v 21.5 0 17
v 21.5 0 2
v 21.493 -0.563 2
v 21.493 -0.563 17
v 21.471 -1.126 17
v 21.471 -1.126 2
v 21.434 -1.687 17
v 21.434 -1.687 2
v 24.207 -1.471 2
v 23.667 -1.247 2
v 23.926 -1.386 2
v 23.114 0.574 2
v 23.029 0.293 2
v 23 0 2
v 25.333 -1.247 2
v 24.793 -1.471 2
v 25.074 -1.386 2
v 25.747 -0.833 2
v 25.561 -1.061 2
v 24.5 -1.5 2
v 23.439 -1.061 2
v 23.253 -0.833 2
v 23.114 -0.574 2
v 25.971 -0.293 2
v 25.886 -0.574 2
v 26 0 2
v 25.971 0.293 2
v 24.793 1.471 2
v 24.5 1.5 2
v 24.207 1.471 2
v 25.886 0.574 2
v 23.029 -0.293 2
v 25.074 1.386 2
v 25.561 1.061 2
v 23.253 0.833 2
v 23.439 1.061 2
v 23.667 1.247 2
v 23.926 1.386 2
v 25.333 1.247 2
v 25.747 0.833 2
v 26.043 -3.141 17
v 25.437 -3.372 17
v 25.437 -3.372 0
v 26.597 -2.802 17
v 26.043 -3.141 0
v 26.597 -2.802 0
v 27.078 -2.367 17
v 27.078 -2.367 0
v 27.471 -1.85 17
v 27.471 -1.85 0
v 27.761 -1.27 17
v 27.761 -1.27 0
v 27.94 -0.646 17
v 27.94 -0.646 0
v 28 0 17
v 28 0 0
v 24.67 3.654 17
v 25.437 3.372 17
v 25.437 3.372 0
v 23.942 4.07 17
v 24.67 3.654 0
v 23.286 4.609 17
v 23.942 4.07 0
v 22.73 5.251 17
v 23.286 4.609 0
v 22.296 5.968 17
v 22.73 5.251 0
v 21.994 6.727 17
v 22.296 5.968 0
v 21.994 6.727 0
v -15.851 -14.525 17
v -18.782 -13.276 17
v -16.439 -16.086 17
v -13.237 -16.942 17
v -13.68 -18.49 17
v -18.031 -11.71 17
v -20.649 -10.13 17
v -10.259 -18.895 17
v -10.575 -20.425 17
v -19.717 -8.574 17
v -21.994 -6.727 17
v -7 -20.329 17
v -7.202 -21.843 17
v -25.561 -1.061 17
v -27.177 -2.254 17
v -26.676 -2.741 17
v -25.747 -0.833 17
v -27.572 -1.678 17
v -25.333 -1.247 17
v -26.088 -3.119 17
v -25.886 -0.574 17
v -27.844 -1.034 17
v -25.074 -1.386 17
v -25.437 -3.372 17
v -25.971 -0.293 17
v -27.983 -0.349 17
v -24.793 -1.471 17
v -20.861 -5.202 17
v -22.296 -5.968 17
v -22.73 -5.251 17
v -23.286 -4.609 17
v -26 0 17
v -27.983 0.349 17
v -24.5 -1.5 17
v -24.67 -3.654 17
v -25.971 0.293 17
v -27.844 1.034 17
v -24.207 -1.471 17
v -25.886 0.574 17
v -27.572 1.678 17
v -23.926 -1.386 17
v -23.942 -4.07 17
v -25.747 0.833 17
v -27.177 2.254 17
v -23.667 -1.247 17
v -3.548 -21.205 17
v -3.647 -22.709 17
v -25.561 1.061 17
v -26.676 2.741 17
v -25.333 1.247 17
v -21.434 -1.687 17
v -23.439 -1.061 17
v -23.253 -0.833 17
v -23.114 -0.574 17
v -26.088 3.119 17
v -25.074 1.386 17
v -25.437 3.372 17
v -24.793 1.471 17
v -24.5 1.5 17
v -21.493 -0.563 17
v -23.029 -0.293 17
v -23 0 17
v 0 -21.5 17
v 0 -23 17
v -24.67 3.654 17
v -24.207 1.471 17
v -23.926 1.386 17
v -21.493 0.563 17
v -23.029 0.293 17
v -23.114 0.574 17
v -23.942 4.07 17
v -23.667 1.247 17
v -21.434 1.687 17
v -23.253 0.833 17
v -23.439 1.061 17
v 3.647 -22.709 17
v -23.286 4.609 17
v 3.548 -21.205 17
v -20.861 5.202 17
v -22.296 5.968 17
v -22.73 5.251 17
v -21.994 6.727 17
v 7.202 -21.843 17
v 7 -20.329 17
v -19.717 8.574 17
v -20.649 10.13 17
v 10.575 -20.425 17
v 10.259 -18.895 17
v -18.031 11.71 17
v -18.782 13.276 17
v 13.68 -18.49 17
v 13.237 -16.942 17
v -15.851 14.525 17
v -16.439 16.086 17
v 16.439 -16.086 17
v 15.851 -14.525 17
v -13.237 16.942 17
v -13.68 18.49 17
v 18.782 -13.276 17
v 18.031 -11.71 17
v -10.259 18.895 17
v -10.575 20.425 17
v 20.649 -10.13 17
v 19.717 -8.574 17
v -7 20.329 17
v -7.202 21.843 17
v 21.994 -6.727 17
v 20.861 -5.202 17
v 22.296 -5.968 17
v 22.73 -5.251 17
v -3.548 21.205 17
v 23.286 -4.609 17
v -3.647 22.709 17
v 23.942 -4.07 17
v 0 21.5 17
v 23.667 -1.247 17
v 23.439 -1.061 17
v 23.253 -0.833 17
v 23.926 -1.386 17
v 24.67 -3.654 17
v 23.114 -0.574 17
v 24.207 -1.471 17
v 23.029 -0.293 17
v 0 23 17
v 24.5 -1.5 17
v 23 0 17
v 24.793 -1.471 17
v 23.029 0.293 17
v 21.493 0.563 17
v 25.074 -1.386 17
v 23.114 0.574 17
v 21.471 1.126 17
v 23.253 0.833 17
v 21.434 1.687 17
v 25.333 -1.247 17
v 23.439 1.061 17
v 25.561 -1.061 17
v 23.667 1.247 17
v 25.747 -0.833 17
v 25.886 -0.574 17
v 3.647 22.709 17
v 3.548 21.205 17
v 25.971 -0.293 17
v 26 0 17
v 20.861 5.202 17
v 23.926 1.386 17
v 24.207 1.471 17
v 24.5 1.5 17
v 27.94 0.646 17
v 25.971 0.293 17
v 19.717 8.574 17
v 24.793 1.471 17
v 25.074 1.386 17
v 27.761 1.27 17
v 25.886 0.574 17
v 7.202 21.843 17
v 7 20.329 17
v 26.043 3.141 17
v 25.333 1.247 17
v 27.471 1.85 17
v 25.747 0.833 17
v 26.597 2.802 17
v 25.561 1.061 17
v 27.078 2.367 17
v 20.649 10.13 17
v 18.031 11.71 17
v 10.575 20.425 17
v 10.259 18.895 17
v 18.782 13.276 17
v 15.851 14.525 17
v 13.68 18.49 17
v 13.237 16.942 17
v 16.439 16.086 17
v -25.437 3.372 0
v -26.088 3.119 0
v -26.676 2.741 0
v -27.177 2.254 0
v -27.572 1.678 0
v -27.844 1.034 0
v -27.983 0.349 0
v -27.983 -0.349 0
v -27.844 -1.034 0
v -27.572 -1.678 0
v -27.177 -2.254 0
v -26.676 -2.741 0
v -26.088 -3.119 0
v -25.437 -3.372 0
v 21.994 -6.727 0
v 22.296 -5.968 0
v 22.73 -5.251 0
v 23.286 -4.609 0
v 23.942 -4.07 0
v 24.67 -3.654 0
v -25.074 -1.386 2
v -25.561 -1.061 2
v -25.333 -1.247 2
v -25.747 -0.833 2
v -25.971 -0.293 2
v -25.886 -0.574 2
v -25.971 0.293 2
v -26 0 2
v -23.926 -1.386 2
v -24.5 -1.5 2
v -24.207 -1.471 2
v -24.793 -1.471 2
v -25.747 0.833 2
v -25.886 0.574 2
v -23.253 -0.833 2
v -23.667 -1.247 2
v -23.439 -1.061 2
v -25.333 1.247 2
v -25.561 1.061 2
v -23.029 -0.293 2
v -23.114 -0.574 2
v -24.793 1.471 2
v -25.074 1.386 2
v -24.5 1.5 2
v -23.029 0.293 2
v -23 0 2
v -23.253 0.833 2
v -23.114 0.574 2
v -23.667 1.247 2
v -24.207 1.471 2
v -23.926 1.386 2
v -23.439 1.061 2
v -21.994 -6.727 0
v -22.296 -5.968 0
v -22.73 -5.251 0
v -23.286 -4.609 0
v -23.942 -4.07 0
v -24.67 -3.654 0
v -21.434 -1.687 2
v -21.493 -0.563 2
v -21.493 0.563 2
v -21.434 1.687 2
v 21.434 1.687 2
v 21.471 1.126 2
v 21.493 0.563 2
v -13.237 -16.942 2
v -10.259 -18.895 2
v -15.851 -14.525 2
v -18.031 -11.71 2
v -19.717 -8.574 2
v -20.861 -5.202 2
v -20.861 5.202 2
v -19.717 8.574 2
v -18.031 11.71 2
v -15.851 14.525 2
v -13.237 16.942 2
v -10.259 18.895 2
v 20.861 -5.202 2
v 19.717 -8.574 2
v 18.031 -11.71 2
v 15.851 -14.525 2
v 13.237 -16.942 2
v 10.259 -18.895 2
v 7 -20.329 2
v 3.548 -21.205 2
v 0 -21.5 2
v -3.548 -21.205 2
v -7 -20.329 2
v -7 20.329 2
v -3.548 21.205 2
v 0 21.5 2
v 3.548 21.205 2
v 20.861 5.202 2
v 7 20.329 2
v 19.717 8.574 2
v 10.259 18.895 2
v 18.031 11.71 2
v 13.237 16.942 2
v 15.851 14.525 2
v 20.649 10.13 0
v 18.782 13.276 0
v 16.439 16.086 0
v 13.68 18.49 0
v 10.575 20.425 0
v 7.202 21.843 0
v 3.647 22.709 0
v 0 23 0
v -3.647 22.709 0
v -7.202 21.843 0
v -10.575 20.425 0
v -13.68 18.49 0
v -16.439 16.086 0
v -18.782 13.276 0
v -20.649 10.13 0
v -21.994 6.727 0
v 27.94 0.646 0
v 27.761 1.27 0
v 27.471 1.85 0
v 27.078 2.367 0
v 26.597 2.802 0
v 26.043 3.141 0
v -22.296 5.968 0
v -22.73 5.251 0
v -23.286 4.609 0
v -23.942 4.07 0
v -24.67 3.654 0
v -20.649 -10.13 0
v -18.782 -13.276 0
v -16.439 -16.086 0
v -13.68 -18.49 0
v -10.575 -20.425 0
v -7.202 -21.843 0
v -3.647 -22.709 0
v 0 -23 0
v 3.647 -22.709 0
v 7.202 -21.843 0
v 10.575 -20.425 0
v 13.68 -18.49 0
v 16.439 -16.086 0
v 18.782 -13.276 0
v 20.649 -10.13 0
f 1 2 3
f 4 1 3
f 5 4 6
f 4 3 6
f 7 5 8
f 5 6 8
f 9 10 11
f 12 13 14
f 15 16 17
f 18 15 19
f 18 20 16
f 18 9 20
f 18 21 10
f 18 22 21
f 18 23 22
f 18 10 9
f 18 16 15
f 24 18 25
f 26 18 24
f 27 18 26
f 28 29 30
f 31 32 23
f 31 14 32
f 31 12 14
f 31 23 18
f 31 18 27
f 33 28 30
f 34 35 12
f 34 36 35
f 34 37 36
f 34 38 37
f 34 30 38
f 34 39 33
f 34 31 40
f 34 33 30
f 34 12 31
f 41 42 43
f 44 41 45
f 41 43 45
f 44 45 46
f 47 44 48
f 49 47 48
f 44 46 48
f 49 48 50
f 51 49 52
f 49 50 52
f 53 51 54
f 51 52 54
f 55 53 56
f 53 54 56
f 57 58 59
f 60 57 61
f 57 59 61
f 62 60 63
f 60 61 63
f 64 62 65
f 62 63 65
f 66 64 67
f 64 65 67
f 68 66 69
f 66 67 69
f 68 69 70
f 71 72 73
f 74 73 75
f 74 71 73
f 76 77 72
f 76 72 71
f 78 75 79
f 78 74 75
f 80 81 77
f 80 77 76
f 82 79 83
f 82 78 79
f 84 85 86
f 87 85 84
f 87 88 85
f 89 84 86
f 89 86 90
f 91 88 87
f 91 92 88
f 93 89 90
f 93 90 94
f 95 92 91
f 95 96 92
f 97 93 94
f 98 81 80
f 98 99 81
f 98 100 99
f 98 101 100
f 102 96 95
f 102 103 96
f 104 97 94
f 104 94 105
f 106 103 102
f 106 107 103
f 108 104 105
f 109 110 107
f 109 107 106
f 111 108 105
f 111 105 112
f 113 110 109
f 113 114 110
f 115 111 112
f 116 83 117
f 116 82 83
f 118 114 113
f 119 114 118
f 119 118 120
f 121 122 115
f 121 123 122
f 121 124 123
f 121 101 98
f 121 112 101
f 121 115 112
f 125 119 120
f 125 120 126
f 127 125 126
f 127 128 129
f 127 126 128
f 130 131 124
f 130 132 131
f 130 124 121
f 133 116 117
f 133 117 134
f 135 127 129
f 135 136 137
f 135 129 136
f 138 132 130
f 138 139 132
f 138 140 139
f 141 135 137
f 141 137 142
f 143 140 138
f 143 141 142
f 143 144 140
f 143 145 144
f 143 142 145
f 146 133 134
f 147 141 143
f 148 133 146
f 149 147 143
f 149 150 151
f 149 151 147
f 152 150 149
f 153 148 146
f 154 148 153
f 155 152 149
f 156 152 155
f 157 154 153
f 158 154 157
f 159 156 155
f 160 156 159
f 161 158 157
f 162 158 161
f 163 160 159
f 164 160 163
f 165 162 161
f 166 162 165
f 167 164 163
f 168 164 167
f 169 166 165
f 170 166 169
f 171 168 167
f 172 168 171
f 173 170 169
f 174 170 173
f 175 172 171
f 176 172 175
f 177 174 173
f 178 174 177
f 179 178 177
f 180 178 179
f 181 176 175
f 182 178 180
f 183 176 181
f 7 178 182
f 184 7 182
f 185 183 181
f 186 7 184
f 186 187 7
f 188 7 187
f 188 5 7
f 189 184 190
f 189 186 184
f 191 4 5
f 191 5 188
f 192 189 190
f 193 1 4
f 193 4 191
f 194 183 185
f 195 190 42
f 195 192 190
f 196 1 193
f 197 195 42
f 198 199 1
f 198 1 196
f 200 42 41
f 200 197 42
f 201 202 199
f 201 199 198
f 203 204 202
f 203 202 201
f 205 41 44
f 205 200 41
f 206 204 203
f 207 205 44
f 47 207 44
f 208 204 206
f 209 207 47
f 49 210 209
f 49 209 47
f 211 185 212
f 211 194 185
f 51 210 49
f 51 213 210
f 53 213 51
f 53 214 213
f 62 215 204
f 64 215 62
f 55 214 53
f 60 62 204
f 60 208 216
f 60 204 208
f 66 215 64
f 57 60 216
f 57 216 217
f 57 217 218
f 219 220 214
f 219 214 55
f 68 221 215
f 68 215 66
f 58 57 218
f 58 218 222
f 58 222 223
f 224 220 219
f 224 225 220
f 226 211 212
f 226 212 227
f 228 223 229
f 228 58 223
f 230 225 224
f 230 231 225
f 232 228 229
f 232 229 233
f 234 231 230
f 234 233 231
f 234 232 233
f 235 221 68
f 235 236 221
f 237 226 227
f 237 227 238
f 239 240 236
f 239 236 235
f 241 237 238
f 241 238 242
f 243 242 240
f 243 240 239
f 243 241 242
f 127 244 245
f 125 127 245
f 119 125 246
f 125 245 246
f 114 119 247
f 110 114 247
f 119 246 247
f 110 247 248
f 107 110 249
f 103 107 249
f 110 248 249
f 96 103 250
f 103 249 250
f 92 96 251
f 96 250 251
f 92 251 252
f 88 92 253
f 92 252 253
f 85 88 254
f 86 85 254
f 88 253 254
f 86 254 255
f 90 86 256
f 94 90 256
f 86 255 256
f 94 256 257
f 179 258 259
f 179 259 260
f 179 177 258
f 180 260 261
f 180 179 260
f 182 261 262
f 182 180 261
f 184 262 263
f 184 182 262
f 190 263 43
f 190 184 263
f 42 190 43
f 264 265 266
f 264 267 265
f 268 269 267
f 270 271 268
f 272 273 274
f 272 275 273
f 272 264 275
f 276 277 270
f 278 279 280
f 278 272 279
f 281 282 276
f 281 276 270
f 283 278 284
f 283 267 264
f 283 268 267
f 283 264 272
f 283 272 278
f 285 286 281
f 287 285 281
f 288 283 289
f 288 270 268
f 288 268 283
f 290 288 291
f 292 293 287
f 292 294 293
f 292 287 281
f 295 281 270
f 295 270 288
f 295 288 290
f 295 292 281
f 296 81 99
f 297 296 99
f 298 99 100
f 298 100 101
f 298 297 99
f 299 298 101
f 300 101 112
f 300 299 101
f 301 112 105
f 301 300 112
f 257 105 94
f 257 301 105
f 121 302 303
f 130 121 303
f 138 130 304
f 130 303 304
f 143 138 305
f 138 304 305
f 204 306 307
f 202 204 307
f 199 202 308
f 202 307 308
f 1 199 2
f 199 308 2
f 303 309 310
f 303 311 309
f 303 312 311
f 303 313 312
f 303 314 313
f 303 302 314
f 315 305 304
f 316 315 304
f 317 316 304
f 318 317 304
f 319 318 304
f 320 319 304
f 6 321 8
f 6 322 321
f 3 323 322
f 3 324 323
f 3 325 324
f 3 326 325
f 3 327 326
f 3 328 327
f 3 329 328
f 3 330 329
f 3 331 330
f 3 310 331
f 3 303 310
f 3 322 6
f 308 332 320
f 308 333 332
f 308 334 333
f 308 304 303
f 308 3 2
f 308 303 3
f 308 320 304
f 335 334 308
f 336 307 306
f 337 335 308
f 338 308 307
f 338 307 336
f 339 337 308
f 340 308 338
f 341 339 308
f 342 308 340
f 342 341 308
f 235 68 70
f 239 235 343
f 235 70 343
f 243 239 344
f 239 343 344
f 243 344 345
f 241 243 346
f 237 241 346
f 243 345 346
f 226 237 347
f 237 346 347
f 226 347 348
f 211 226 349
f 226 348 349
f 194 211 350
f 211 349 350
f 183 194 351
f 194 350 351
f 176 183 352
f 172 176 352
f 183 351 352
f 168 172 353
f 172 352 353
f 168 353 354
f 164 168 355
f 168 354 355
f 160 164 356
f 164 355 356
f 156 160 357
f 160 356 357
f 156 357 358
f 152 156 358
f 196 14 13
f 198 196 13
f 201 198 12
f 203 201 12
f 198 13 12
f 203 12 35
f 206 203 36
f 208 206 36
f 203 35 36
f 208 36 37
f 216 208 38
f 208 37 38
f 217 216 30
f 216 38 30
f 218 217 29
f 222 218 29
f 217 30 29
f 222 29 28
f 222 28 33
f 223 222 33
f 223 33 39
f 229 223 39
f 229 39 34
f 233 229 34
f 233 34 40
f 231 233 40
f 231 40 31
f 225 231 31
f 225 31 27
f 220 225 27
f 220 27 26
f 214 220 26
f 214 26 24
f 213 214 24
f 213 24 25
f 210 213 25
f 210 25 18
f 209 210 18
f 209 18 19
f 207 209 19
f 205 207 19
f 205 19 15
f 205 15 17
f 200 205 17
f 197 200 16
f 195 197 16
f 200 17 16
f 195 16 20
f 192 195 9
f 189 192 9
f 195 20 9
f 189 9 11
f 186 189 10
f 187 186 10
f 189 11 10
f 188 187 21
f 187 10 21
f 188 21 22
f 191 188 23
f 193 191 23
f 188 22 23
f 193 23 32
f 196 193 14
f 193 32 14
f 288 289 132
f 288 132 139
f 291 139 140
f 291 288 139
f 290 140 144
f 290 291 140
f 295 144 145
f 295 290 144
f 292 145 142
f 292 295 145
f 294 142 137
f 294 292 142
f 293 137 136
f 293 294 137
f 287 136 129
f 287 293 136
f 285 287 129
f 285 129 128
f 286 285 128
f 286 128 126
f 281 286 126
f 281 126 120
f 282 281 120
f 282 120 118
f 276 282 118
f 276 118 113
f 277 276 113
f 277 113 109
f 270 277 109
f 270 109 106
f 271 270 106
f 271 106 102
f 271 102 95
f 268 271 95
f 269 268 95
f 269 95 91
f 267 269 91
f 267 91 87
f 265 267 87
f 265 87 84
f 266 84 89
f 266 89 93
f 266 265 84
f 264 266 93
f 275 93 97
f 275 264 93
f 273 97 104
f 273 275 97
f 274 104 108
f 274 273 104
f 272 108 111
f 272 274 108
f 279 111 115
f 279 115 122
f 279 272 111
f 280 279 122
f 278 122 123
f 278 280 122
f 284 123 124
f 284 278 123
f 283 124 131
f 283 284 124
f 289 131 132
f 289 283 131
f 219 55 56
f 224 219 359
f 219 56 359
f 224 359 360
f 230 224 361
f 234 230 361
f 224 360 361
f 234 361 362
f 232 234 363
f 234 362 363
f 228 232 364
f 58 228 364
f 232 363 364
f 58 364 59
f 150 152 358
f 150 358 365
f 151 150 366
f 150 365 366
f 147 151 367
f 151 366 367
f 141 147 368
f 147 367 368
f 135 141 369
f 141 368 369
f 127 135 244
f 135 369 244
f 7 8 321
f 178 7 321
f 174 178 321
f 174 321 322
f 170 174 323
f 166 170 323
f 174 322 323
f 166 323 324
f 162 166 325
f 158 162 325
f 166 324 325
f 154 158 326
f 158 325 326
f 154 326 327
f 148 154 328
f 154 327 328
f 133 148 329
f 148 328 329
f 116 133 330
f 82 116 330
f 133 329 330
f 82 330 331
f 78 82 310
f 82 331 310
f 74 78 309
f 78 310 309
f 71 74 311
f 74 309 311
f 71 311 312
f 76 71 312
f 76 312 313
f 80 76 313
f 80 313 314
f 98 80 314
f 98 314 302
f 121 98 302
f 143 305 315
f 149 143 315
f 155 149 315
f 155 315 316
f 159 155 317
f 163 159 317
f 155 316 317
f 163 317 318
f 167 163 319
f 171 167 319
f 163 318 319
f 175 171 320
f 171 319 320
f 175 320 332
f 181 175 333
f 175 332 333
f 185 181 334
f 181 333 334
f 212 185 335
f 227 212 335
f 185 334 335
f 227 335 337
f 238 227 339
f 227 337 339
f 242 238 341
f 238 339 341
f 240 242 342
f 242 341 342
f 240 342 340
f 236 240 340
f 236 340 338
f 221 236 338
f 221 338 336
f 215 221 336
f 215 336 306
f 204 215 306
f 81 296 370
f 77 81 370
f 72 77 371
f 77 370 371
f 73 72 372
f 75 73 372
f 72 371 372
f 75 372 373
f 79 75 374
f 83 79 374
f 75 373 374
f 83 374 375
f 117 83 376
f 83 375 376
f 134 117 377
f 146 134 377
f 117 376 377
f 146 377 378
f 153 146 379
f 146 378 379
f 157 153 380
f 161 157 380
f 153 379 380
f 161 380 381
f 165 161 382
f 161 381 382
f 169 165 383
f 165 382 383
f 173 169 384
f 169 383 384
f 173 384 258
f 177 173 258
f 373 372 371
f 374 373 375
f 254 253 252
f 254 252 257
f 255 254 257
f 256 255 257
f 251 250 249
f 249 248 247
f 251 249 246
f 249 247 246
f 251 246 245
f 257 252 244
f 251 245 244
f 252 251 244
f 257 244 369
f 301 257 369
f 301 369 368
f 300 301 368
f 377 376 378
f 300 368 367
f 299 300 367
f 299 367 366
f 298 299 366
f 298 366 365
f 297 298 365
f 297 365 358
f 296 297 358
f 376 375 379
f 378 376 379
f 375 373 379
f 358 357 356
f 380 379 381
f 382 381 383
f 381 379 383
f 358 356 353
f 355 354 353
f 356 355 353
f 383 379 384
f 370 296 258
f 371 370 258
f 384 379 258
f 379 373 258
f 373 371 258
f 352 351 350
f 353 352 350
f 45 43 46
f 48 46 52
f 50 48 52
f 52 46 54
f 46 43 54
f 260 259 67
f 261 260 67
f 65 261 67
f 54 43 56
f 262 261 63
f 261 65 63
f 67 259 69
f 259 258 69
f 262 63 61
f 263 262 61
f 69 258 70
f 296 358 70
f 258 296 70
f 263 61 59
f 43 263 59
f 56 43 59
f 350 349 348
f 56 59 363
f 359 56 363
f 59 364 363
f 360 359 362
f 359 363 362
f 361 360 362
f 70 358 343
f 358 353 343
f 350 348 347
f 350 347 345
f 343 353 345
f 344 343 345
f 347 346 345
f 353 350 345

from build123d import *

# Parameters (mm, degrees)
F0_R     = 1.5
F1_DEPTH = 17
F2_DEPTH = 2
F3_R     = 5


with BuildPart() as f1:
    # F0 (on Top) → F1 (new body)
    with BuildSketch(Plane.XY):
        with BuildLine():
            ThreePointArc((21.4336734694, 1.6874956615), (21.4834119682, 0.8443993155), (21.5, 0))
            ThreePointArc((21.5, 0), (21.4834119682, -0.8443993155), (21.4336734694, -1.6874956615))
            ThreePointArc((21.4336734694, -1.6874956615), (22.0184319463, -2.4681612579), (22.7959183673, -3.0571401324))
            ThreePointArc((22.7959183673, -3.0571401324), (22.9489228772, -1.531972185), (23, 0))
            ThreePointArc((23, 0), (22.9489228772, 1.531972185), (22.7959183673, 3.0571401324))
            ThreePointArc((22.7959183673, 3.0571401324), (22.0184319463, 2.4681612579), (21.4336734694, 1.6874956615))
        make_face()
        with BuildLine():
            ThreePointArc((-21.4336734694, 1.6874956615), (0, 21.5), (21.4336734694, 1.6874956615))
            ThreePointArc((21.4336734694, 1.6874956615), (22.0184319463, 2.4681612579), (22.7959183673, 3.0571401324))
            ThreePointArc((22.7959183673, 3.0571401324), (0, 23), (-22.7959183673, 3.0571401324))
            ThreePointArc((-22.7959183673, 3.0571401324), (-22.0184319463, 2.4681612579), (-21.4336734694, 1.6874956615))
        make_face()
        with BuildLine():
            ThreePointArc((22.7959183673, -3.0571401324), (22.0184319463, -2.4681612579), (21.4336734694, -1.6874956615))
            ThreePointArc((21.4336734694, -1.6874956615), (0, -21.5), (-21.4336734694, -1.6874956615))
            ThreePointArc((-21.4336734694, -1.6874956615), (-22.0184319463, -2.4681612579), (-22.7959183673, -3.0571401324))
            ThreePointArc((-22.7959183673, -3.0571401324), (0, -23), (22.7959183673, -3.0571401324))
        make_face()
        with BuildLine():
            ThreePointArc((-21.4336734694, -1.6874956615), (-21.5, 0), (-21.4336734694, 1.6874956615))
            ThreePointArc((-21.4336734694, 1.6874956615), (-22.0184319463, 2.4681612579), (-22.7959183673, 3.0571401324))
            ThreePointArc((-22.7959183673, 3.0571401324), (-22.9489228772, 1.531972185), (-23, 0))
            ThreePointArc((-23, 0), (-22.9489228772, -1.531972185), (-22.7959183673, -3.0571401324))
            ThreePointArc((-22.7959183673, -3.0571401324), (-22.0184319463, -2.4681612579), (-21.4336734694, -1.6874956615))
        make_face()
        with BuildLine():
            ThreePointArc((28, 0), (26.2728105209, 3.0178043106), (22.7959183673, 3.0571401324))
            ThreePointArc((22.7959183673, 3.0571401324), (22.9489228772, 1.531972185), (23, 0))
            ThreePointArc((23, 0), (22.9489228772, -1.531972185), (22.7959183673, -3.0571401324))
            ThreePointArc((22.7959183673, -3.0571401324), (26.2728105209, -3.0178043106), (28, 0))
        make_face()
        with BuildLine():
            ThreePointArc((26, 0), (24.5, -1.5), (23, 0))
            ThreePointArc((23, 0), (24.5, 1.5), (26, 0))
        make_face(mode=Mode.SUBTRACT)
        with BuildLine():
            ThreePointArc((-23, 0), (-22.9489228772, 1.531972185), (-22.7959183673, 3.0571401324))
            ThreePointArc((-22.7959183673, 3.0571401324), (-28, 0), (-22.7959183673, -3.0571401324))
            ThreePointArc((-22.7959183673, -3.0571401324), (-22.9489228772, -1.531972185), (-23, 0))
        make_face()
        with Locations((-24.5, 0)):
            Circle(F0_R, mode=Mode.SUBTRACT)
    extrude(amount=F1_DEPTH)

    # F0 (on Top) → F2 (join)
    with BuildSketch(Plane.XY):
        with BuildLine():
            ThreePointArc((21.4336734694, 1.6874956615), (21.4834119682, 0.8443993155), (21.5, 0))
            ThreePointArc((21.5, 0), (21.4834119682, -0.8443993155), (21.4336734694, -1.6874956615))
            ThreePointArc((21.4336734694, -1.6874956615), (22.0184319463, -2.4681612579), (22.7959183673, -3.0571401324))
            ThreePointArc((22.7959183673, -3.0571401324), (22.9489228772, -1.531972185), (23, 0))
            ThreePointArc((23, 0), (22.9489228772, 1.531972185), (22.7959183673, 3.0571401324))
            ThreePointArc((22.7959183673, 3.0571401324), (22.0184319463, 2.4681612579), (21.4336734694, 1.6874956615))
        make_face()
        with BuildLine():
            ThreePointArc((-21.4336734694, 1.6874956615), (0, 21.5), (21.4336734694, 1.6874956615))
            ThreePointArc((21.4336734694, 1.6874956615), (22.0184319463, 2.4681612579), (22.7959183673, 3.0571401324))
            ThreePointArc((22.7959183673, 3.0571401324), (0, 23), (-22.7959183673, 3.0571401324))
            ThreePointArc((-22.7959183673, 3.0571401324), (-22.0184319463, 2.4681612579), (-21.4336734694, 1.6874956615))
        make_face()
        with BuildLine():
            ThreePointArc((22.7959183673, -3.0571401324), (22.0184319463, -2.4681612579), (21.4336734694, -1.6874956615))
            ThreePointArc((21.4336734694, -1.6874956615), (0, -21.5), (-21.4336734694, -1.6874956615))
            ThreePointArc((-21.4336734694, -1.6874956615), (-22.0184319463, -2.4681612579), (-22.7959183673, -3.0571401324))
            ThreePointArc((-22.7959183673, -3.0571401324), (0, -23), (22.7959183673, -3.0571401324))
        make_face()
        with BuildLine():
            ThreePointArc((-21.4336734694, -1.6874956615), (-21.5, 0), (-21.4336734694, 1.6874956615))
            ThreePointArc((-21.4336734694, 1.6874956615), (-22.0184319463, 2.4681612579), (-22.7959183673, 3.0571401324))
            ThreePointArc((-22.7959183673, 3.0571401324), (-22.9489228772, 1.531972185), (-23, 0))
            ThreePointArc((-23, 0), (-22.9489228772, -1.531972185), (-22.7959183673, -3.0571401324))
            ThreePointArc((-22.7959183673, -3.0571401324), (-22.0184319463, -2.4681612579), (-21.4336734694, -1.6874956615))
        make_face()
        with BuildLine():
            ThreePointArc((28, 0), (26.2728105209, 3.0178043106), (22.7959183673, 3.0571401324))
            ThreePointArc((22.7959183673, 3.0571401324), (22.9489228772, 1.531972185), (23, 0))
            ThreePointArc((23, 0), (22.9489228772, -1.531972185), (22.7959183673, -3.0571401324))
            ThreePointArc((22.7959183673, -3.0571401324), (26.2728105209, -3.0178043106), (28, 0))
        make_face()
        with BuildLine():
            ThreePointArc((26, 0), (24.5, -1.5), (23, 0))
            ThreePointArc((23, 0), (24.5, 1.5), (26, 0))
        make_face(mode=Mode.SUBTRACT)
        with BuildLine():
            ThreePointArc((-23, 0), (-22.9489228772, 1.531972185), (-22.7959183673, 3.0571401324))
            ThreePointArc((-22.7959183673, 3.0571401324), (-28, 0), (-22.7959183673, -3.0571401324))
            ThreePointArc((-22.7959183673, -3.0571401324), (-22.9489228772, -1.531972185), (-23, 0))
        make_face()
        with Locations((-24.5, 0)):
            Circle(F0_R, mode=Mode.SUBTRACT)
        with BuildLine():
            ThreePointArc((21.4336734694, -1.6874956615), (21, 0), (21.4336734694, 1.6874956615))
            ThreePointArc((21.4336734694, 1.6874956615), (0, 21.5), (-21.4336734694, 1.6874956615))
            ThreePointArc((-21.4336734694, 1.6874956615), (-21.1101517101, 0.8711650655), (-21, 0))
            ThreePointArc((-21, 0), (-21.1101517101, -0.8711650655), (-21.4336734694, -1.6874956615))
            ThreePointArc((-21.4336734694, -1.6874956615), (0, -21.5), (21.4336734694, -1.6874956615))
        make_face()
        with BuildLine():
            ThreePointArc((-21, 0), (-21.1101517101, 0.8711650655), (-21.4336734694, 1.6874956615))
            ThreePointArc((-21.4336734694, 1.6874956615), (-21.5, 0), (-21.4336734694, -1.6874956615))
            ThreePointArc((-21.4336734694, -1.6874956615), (-21.1101517101, -0.8711650655), (-21, 0))
        make_face()
        with BuildLine():
            ThreePointArc((21.4336734694, -1.6874956615), (21.4834119682, -0.8443993155), (21.5, 0))
            ThreePointArc((21.5, 0), (21.4834119682, 0.8443993155), (21.4336734694, 1.6874956615))
            ThreePointArc((21.4336734694, 1.6874956615), (21, 0), (21.4336734694, -1.6874956615))
        make_face()
        with Locations((-24.5, 0)):
            Circle(F0_R)
        with BuildLine():
            ThreePointArc((26, 0), (24.5, 1.5), (23, 0))
            ThreePointArc((23, 0), (24.5, -1.5), (26, 0))
        make_face()
    extrude(amount=F2_DEPTH)

    # F3
    f3_edges = [f1.edges().sort_by_distance(p)[0] for p in [
        (-22.795918, 3.05714, 8.5),
        (-22.795918, -3.05714, 8.5),
        (22.795918, -3.05714, 8.5),
        (22.795918, 3.05714, 8.5),
    ]]
    fillet(f3_edges, radius=F3_R)


solid = f1.part
